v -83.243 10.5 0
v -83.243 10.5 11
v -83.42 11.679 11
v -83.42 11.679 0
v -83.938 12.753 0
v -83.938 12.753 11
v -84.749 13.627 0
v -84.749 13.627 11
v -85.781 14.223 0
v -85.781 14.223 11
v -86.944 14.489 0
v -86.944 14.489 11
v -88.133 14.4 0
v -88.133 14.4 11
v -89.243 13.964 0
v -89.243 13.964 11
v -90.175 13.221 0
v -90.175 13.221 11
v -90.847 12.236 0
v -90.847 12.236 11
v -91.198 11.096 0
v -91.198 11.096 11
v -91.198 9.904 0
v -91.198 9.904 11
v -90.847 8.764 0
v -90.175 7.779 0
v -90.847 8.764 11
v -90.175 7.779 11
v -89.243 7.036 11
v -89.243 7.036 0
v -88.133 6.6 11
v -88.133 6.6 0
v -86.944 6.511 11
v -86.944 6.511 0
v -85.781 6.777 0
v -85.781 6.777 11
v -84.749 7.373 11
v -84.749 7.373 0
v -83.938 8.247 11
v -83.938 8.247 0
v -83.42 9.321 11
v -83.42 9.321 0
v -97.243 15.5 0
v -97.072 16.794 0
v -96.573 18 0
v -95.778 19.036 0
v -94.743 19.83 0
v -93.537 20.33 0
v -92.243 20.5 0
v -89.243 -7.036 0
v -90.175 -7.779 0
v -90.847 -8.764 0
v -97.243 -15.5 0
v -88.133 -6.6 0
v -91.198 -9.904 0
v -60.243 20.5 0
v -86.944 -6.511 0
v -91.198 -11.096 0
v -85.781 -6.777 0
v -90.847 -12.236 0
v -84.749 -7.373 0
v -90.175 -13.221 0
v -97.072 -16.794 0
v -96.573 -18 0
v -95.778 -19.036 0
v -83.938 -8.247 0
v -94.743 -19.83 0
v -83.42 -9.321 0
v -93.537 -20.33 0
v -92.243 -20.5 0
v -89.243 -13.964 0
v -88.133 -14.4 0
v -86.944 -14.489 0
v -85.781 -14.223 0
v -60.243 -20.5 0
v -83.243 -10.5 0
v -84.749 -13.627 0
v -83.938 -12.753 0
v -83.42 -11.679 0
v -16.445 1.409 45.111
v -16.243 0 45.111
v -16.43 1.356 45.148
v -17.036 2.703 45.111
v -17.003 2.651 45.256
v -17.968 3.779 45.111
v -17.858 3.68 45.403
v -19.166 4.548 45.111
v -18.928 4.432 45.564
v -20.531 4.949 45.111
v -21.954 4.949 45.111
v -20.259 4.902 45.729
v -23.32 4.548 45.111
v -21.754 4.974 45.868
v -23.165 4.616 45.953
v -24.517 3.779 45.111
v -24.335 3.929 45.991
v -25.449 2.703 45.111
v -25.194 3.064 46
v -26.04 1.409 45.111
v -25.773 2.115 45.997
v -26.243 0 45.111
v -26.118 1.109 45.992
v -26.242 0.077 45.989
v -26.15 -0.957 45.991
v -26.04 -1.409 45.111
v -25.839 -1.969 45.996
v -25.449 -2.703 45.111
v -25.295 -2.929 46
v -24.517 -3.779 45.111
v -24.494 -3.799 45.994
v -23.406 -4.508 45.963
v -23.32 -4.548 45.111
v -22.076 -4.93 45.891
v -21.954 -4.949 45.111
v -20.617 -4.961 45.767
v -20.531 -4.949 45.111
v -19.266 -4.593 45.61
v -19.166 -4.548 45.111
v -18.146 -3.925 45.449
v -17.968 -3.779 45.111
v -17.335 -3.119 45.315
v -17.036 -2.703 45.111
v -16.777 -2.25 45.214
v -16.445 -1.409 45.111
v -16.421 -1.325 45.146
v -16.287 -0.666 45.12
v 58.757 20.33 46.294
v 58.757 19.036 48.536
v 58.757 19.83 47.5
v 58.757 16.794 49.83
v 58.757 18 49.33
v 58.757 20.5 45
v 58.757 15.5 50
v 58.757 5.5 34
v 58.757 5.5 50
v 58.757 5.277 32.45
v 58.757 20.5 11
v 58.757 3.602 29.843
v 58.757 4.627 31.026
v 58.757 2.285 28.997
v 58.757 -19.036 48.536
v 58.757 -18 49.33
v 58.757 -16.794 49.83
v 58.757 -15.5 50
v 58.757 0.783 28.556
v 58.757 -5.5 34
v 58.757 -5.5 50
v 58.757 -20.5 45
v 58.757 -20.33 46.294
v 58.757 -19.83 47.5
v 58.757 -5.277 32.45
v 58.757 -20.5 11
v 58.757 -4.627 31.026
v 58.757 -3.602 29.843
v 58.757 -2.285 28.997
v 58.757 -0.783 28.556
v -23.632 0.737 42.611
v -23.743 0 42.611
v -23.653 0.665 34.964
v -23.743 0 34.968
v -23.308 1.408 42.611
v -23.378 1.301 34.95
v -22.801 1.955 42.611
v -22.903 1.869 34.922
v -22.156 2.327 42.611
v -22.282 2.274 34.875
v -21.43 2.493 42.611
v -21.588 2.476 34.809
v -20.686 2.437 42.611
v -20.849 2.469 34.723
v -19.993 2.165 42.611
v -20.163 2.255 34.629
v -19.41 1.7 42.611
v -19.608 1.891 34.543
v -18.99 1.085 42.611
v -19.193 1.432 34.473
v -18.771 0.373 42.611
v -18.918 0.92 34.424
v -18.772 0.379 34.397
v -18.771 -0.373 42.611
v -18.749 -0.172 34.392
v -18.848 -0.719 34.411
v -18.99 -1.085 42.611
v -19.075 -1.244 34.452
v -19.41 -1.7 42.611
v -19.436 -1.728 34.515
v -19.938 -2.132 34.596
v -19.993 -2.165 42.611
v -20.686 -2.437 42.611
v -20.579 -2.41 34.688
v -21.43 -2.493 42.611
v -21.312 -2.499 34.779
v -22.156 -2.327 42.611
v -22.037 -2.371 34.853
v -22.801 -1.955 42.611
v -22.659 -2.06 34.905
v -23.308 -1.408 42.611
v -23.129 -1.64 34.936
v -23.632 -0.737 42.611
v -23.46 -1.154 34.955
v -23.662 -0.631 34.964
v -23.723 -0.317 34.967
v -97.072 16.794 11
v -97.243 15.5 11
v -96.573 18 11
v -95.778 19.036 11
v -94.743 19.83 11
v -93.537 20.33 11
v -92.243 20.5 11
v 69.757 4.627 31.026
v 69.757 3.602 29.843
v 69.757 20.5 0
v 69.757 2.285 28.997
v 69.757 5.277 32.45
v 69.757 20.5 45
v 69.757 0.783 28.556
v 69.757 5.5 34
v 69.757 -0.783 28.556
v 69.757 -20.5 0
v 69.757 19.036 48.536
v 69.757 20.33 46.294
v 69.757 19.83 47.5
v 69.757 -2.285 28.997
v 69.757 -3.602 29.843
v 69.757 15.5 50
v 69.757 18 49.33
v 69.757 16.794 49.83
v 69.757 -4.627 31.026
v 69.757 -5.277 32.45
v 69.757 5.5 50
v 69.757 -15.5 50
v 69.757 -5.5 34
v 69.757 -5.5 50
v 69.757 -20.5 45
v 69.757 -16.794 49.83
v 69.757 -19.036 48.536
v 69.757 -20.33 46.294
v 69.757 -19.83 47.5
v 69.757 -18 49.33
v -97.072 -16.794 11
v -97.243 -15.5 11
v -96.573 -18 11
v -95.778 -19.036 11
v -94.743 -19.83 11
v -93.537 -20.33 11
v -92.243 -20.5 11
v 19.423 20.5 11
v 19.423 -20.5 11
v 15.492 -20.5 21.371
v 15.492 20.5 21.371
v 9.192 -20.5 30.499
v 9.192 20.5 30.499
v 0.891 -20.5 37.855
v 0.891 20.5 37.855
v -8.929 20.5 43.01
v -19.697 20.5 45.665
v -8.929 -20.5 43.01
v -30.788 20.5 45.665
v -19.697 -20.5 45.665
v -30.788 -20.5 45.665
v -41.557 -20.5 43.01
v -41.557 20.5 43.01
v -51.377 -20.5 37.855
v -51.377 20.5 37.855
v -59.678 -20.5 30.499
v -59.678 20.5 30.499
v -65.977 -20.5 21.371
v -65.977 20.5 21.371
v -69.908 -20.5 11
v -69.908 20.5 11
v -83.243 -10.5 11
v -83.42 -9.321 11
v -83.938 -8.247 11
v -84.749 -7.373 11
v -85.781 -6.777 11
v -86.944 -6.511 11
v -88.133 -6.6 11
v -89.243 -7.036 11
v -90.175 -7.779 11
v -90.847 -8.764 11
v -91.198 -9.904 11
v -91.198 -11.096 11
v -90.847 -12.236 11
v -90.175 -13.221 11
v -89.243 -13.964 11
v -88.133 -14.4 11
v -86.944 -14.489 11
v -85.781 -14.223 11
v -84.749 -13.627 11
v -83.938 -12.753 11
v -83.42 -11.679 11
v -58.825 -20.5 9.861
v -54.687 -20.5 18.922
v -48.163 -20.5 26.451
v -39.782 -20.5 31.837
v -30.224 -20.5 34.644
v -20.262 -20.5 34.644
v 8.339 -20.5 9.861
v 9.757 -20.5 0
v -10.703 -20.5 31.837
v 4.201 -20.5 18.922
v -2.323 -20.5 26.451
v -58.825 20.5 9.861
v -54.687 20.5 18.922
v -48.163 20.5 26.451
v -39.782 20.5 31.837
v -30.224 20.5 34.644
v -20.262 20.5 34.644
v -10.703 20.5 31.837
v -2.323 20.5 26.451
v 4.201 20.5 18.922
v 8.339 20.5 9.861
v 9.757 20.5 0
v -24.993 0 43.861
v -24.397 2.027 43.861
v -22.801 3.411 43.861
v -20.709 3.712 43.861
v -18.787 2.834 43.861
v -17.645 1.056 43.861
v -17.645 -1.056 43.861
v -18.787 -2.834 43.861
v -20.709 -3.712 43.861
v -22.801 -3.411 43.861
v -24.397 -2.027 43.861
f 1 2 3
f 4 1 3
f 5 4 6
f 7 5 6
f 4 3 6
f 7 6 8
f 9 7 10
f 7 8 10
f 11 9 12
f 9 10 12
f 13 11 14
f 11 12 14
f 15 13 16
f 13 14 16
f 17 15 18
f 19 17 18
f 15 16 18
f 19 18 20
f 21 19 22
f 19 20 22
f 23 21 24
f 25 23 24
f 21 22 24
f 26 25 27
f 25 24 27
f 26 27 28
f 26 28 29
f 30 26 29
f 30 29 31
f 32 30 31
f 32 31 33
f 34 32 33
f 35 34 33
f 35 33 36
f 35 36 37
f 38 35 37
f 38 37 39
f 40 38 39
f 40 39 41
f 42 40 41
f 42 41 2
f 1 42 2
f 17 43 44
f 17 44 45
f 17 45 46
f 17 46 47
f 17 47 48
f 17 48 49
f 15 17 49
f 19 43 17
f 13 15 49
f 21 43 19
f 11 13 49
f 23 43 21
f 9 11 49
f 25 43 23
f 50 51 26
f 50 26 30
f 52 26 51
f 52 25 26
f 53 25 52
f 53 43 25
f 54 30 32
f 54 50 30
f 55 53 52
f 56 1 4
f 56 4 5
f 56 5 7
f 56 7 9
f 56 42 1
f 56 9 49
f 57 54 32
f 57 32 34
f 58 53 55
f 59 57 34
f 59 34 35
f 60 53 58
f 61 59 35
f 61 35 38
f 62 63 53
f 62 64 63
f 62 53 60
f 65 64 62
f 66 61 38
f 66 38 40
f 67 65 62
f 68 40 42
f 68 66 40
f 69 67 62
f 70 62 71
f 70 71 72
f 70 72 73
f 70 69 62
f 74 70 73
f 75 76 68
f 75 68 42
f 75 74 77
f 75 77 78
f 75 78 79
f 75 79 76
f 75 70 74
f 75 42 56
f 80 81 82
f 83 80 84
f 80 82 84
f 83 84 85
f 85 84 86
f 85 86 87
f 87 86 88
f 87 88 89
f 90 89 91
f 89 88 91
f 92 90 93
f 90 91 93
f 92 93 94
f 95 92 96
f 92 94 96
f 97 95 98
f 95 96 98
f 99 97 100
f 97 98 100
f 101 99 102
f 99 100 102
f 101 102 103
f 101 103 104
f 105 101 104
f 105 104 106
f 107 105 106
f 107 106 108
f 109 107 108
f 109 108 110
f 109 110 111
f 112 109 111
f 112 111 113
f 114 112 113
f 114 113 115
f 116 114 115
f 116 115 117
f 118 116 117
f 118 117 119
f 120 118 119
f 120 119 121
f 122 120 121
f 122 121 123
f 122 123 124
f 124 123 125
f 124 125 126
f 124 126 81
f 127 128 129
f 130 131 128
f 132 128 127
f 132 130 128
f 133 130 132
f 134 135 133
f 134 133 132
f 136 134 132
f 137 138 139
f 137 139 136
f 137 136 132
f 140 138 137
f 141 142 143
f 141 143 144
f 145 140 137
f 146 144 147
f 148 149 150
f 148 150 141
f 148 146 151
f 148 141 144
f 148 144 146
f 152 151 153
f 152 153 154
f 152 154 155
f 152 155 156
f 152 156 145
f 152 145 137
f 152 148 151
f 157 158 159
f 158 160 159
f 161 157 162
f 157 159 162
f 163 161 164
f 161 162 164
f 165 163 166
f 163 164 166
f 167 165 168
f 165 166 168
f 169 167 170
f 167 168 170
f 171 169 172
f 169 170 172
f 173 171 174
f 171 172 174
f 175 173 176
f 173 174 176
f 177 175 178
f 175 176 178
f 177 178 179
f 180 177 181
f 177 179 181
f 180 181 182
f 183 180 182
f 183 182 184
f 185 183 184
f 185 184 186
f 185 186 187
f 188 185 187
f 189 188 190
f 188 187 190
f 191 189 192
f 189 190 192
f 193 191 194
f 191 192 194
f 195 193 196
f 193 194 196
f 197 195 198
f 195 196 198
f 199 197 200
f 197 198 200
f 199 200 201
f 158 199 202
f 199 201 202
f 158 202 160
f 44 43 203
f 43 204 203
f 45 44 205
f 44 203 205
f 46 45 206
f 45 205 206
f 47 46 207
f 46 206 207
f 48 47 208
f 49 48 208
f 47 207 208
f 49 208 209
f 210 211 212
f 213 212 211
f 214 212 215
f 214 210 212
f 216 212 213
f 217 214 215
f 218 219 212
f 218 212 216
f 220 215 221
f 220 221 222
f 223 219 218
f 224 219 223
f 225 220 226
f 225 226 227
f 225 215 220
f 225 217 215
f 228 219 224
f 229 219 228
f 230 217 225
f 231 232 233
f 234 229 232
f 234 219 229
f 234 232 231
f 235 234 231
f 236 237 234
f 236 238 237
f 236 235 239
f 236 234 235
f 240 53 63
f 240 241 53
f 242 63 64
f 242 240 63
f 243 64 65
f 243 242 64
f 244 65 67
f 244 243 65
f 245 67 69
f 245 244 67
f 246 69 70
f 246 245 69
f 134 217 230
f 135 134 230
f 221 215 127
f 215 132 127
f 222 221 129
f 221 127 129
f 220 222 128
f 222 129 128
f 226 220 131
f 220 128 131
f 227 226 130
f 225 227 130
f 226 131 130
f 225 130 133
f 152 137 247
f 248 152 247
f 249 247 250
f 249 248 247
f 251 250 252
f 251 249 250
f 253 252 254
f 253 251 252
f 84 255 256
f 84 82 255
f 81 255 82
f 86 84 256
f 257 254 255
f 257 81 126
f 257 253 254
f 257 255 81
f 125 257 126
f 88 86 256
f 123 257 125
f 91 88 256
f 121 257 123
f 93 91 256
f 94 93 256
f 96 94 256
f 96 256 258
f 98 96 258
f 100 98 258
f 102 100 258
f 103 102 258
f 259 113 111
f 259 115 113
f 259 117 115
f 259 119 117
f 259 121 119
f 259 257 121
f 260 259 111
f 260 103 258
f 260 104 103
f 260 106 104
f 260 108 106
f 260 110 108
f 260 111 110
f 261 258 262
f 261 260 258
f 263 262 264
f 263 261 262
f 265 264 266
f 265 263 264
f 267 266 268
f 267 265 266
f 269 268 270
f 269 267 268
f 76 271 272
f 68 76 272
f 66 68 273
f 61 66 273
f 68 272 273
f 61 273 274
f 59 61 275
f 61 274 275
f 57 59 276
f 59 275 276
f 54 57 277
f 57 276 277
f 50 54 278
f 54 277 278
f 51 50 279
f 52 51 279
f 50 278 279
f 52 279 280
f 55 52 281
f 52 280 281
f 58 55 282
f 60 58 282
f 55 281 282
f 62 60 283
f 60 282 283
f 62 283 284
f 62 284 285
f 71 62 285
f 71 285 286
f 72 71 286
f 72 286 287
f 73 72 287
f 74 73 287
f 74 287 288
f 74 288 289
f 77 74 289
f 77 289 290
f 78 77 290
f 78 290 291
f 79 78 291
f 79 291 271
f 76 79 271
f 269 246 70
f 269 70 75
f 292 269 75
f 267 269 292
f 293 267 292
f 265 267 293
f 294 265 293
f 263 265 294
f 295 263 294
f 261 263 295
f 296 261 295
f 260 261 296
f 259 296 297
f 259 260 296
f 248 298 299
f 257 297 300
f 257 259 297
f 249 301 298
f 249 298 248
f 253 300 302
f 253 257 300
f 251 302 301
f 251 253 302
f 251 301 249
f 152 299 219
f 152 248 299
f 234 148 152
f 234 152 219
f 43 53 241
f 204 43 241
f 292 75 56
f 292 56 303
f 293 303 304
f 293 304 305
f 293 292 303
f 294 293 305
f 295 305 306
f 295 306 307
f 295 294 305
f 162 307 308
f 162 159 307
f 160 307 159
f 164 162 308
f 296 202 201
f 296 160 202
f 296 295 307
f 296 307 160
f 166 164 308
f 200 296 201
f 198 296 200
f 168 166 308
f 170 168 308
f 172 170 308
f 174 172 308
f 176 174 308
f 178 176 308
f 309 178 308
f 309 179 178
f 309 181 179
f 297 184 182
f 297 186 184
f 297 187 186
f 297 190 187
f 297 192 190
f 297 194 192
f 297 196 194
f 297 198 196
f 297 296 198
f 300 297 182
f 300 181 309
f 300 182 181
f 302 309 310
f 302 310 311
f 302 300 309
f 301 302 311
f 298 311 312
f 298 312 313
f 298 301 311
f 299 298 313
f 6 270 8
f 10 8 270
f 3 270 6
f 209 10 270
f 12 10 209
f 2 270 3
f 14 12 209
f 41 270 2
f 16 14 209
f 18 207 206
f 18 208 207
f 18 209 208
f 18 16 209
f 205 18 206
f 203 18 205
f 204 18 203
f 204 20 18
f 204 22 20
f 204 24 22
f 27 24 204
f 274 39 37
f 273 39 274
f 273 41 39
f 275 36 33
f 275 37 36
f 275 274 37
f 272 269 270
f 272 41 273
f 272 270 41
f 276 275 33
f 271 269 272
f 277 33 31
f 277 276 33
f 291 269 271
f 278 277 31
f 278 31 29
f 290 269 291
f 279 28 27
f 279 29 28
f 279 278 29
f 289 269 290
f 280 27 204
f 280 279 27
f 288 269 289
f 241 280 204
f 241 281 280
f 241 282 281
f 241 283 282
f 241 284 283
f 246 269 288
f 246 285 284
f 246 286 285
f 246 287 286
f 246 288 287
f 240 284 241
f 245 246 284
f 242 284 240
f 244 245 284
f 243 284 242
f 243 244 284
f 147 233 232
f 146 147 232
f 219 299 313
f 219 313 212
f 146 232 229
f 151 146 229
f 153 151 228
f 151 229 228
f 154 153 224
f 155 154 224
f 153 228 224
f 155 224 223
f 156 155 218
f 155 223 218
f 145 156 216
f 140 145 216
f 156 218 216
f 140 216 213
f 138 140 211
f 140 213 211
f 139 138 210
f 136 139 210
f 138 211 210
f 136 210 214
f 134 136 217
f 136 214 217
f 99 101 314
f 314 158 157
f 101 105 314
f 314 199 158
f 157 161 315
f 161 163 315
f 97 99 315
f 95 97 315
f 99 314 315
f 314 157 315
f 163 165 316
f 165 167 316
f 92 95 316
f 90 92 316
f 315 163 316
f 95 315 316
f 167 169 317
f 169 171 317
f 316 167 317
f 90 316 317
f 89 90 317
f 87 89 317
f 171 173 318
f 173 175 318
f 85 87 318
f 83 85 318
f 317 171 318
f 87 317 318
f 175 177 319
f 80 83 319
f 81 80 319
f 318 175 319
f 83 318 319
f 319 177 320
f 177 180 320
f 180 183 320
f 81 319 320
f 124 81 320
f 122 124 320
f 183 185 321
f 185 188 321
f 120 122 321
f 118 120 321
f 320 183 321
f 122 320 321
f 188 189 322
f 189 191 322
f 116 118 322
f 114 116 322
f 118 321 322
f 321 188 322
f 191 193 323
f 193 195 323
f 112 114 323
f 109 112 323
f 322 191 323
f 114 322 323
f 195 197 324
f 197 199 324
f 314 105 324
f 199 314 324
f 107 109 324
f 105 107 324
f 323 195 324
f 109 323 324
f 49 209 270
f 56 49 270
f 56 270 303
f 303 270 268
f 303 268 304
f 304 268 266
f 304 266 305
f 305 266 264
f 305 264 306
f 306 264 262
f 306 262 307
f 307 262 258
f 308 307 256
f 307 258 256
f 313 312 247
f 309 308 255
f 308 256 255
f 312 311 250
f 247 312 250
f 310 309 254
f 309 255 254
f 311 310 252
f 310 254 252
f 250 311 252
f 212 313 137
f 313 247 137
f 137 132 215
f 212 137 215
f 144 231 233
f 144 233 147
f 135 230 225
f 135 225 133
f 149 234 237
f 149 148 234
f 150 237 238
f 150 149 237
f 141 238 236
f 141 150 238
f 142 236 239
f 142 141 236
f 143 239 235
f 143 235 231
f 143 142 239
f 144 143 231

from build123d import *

# Parameters (mm, degrees)
F0_W           = 26
F0_H           = 11
F0_W_2         = 38
F1_DEPTH       = 20.5
F2_R           = 5
F3_R           = 5
F4_R           = 4
F5_DEPTH       = 12
F7_DEPTH       = 25
F9_D           = 5
F9_START       = 4.8890258
F9_CSINK_D     = 10
F9_CSINK_ANGLE = 90


# Not quite as in the source:
# - a feature names something its author has since deleted; it is built from what else it names


with BuildPart() as f1:
    # F0 (on Front) → F1 (new body, symmetric)
    with BuildSketch(Plane.XZ):
        with Locations((-84.2427663654, 5.5)):
            Rectangle(F0_W, F0_H)
        with BuildLine():
            Line((-69.9081892337, 11), (-71.2427663654, 11))
            Line((-71.2427663654, 11), (-71.2427663654, 0))
            ThreePointArc((-71.2427663654, 0), (-70.9079032421, 5.5403315812), (-69.9081892337, 11))
        make_face()
        with BuildLine():
            ThreePointArc((-69.9081892337, 11), (-70.9079032421, 5.5403315812), (-71.2427663654, 0))
            Line((-71.2427663654, 0), (-60.2427663654, 0))
            ThreePointArc((-60.2427663654, 0), (-25.2427663654, 35), (9.7572336346, 0))
            Line((9.7572336346, 0), (20.7572336346, 0))
            ThreePointArc((20.7572336346, 0), (20.4223705113, 5.5403315812), (19.4226565028, 11))
            ThreePointArc((19.4226565028, 11), (-25.2427663654, 46), (-69.9081892337, 11))
        make_face()
        with BuildLine():
            ThreePointArc((19.4226565028, 11), (20.4223705113, 5.5403315812), (20.7572336346, 0))
            Line((20.7572336346, 0), (20.7572336346, 11))
            Line((20.7572336346, 11), (19.4226565028, 11))
        make_face()
        with Locations((39.7572336346, 5.5)):
            Rectangle(F0_W_2, F0_H)
        Polygon((58.7572336346, 11), (58.7572336346, 0), (69.7572336346, 0), (69.7572336346, 50), (58.7572336346, 50), align=None)
    extrude(amount=F1_DEPTH, both=True)

    # F2
    f2_edges = [f1.edges().sort_by_distance(p)[0] for p in [
        (-97.242766, -20.5, 5.5),
        (-97.242766, 20.5, 5.5),
    ]]
    fillet(f2_edges, radius=F2_R)

    # F3
    f3_edges = [f1.edges().sort_by_distance(p)[0] for p in [
        (64.257234, -20.5, 50),
        (64.257234, 20.5, 50),
    ]]
    fillet(f3_edges, radius=F3_R)

    # F4 (on face) → F5 (cut)
    with BuildSketch(Plane.XY.offset(11)):
        with Locations((-87.2427663654, 10.5)):
            Circle(F4_R)
        with Locations((-87.2427663654, -10.5)):
            Circle(F4_R)
    extrude(amount=-F5_DEPTH, mode=Mode.SUBTRACT)

    # F6 (on face) → F7 (cut)
    with BuildSketch(Plane.YZ.offset(69.7572336346)):
        with BuildLine():
            Line((5.5, 50), (-5.5, 50))
            Line((-5.5, 50), (-5.5, 45))
            Line((-5.5, 45), (-5.5, 34))
            ThreePointArc((-5.5, 34), (0, 39.5), (5.5, 34))
            Line((5.5, 34), (5.5, 45))
            Line((5.5, 45), (5.5, 50))
        make_face()
        with BuildLine():
            ThreePointArc((5.5, 34), (0, 39.5), (-5.5, 34))
            Line((-5.5, 34), (5.5, 34))
        make_face()
        with BuildLine():
            Line((5.5, 34), (-5.5, 34))
            ThreePointArc((-5.5, 34), (0, 28.5), (5.5, 34))
        make_face()
    extrude(amount=-F7_DEPTH, mode=Mode.SUBTRACT)

    # F9 (through all)
    # its depths count from where the whole tool has entered the part; down to there all is cleared
    with Locations(Plane.XY.offset(50).offset(-F9_START)):
        with Locations((-21.2427663654, 0)):
            CounterSinkHole(F9_D / 2, F9_CSINK_D / 2, counter_sink_angle=F9_CSINK_ANGLE)


solid = f1.part
